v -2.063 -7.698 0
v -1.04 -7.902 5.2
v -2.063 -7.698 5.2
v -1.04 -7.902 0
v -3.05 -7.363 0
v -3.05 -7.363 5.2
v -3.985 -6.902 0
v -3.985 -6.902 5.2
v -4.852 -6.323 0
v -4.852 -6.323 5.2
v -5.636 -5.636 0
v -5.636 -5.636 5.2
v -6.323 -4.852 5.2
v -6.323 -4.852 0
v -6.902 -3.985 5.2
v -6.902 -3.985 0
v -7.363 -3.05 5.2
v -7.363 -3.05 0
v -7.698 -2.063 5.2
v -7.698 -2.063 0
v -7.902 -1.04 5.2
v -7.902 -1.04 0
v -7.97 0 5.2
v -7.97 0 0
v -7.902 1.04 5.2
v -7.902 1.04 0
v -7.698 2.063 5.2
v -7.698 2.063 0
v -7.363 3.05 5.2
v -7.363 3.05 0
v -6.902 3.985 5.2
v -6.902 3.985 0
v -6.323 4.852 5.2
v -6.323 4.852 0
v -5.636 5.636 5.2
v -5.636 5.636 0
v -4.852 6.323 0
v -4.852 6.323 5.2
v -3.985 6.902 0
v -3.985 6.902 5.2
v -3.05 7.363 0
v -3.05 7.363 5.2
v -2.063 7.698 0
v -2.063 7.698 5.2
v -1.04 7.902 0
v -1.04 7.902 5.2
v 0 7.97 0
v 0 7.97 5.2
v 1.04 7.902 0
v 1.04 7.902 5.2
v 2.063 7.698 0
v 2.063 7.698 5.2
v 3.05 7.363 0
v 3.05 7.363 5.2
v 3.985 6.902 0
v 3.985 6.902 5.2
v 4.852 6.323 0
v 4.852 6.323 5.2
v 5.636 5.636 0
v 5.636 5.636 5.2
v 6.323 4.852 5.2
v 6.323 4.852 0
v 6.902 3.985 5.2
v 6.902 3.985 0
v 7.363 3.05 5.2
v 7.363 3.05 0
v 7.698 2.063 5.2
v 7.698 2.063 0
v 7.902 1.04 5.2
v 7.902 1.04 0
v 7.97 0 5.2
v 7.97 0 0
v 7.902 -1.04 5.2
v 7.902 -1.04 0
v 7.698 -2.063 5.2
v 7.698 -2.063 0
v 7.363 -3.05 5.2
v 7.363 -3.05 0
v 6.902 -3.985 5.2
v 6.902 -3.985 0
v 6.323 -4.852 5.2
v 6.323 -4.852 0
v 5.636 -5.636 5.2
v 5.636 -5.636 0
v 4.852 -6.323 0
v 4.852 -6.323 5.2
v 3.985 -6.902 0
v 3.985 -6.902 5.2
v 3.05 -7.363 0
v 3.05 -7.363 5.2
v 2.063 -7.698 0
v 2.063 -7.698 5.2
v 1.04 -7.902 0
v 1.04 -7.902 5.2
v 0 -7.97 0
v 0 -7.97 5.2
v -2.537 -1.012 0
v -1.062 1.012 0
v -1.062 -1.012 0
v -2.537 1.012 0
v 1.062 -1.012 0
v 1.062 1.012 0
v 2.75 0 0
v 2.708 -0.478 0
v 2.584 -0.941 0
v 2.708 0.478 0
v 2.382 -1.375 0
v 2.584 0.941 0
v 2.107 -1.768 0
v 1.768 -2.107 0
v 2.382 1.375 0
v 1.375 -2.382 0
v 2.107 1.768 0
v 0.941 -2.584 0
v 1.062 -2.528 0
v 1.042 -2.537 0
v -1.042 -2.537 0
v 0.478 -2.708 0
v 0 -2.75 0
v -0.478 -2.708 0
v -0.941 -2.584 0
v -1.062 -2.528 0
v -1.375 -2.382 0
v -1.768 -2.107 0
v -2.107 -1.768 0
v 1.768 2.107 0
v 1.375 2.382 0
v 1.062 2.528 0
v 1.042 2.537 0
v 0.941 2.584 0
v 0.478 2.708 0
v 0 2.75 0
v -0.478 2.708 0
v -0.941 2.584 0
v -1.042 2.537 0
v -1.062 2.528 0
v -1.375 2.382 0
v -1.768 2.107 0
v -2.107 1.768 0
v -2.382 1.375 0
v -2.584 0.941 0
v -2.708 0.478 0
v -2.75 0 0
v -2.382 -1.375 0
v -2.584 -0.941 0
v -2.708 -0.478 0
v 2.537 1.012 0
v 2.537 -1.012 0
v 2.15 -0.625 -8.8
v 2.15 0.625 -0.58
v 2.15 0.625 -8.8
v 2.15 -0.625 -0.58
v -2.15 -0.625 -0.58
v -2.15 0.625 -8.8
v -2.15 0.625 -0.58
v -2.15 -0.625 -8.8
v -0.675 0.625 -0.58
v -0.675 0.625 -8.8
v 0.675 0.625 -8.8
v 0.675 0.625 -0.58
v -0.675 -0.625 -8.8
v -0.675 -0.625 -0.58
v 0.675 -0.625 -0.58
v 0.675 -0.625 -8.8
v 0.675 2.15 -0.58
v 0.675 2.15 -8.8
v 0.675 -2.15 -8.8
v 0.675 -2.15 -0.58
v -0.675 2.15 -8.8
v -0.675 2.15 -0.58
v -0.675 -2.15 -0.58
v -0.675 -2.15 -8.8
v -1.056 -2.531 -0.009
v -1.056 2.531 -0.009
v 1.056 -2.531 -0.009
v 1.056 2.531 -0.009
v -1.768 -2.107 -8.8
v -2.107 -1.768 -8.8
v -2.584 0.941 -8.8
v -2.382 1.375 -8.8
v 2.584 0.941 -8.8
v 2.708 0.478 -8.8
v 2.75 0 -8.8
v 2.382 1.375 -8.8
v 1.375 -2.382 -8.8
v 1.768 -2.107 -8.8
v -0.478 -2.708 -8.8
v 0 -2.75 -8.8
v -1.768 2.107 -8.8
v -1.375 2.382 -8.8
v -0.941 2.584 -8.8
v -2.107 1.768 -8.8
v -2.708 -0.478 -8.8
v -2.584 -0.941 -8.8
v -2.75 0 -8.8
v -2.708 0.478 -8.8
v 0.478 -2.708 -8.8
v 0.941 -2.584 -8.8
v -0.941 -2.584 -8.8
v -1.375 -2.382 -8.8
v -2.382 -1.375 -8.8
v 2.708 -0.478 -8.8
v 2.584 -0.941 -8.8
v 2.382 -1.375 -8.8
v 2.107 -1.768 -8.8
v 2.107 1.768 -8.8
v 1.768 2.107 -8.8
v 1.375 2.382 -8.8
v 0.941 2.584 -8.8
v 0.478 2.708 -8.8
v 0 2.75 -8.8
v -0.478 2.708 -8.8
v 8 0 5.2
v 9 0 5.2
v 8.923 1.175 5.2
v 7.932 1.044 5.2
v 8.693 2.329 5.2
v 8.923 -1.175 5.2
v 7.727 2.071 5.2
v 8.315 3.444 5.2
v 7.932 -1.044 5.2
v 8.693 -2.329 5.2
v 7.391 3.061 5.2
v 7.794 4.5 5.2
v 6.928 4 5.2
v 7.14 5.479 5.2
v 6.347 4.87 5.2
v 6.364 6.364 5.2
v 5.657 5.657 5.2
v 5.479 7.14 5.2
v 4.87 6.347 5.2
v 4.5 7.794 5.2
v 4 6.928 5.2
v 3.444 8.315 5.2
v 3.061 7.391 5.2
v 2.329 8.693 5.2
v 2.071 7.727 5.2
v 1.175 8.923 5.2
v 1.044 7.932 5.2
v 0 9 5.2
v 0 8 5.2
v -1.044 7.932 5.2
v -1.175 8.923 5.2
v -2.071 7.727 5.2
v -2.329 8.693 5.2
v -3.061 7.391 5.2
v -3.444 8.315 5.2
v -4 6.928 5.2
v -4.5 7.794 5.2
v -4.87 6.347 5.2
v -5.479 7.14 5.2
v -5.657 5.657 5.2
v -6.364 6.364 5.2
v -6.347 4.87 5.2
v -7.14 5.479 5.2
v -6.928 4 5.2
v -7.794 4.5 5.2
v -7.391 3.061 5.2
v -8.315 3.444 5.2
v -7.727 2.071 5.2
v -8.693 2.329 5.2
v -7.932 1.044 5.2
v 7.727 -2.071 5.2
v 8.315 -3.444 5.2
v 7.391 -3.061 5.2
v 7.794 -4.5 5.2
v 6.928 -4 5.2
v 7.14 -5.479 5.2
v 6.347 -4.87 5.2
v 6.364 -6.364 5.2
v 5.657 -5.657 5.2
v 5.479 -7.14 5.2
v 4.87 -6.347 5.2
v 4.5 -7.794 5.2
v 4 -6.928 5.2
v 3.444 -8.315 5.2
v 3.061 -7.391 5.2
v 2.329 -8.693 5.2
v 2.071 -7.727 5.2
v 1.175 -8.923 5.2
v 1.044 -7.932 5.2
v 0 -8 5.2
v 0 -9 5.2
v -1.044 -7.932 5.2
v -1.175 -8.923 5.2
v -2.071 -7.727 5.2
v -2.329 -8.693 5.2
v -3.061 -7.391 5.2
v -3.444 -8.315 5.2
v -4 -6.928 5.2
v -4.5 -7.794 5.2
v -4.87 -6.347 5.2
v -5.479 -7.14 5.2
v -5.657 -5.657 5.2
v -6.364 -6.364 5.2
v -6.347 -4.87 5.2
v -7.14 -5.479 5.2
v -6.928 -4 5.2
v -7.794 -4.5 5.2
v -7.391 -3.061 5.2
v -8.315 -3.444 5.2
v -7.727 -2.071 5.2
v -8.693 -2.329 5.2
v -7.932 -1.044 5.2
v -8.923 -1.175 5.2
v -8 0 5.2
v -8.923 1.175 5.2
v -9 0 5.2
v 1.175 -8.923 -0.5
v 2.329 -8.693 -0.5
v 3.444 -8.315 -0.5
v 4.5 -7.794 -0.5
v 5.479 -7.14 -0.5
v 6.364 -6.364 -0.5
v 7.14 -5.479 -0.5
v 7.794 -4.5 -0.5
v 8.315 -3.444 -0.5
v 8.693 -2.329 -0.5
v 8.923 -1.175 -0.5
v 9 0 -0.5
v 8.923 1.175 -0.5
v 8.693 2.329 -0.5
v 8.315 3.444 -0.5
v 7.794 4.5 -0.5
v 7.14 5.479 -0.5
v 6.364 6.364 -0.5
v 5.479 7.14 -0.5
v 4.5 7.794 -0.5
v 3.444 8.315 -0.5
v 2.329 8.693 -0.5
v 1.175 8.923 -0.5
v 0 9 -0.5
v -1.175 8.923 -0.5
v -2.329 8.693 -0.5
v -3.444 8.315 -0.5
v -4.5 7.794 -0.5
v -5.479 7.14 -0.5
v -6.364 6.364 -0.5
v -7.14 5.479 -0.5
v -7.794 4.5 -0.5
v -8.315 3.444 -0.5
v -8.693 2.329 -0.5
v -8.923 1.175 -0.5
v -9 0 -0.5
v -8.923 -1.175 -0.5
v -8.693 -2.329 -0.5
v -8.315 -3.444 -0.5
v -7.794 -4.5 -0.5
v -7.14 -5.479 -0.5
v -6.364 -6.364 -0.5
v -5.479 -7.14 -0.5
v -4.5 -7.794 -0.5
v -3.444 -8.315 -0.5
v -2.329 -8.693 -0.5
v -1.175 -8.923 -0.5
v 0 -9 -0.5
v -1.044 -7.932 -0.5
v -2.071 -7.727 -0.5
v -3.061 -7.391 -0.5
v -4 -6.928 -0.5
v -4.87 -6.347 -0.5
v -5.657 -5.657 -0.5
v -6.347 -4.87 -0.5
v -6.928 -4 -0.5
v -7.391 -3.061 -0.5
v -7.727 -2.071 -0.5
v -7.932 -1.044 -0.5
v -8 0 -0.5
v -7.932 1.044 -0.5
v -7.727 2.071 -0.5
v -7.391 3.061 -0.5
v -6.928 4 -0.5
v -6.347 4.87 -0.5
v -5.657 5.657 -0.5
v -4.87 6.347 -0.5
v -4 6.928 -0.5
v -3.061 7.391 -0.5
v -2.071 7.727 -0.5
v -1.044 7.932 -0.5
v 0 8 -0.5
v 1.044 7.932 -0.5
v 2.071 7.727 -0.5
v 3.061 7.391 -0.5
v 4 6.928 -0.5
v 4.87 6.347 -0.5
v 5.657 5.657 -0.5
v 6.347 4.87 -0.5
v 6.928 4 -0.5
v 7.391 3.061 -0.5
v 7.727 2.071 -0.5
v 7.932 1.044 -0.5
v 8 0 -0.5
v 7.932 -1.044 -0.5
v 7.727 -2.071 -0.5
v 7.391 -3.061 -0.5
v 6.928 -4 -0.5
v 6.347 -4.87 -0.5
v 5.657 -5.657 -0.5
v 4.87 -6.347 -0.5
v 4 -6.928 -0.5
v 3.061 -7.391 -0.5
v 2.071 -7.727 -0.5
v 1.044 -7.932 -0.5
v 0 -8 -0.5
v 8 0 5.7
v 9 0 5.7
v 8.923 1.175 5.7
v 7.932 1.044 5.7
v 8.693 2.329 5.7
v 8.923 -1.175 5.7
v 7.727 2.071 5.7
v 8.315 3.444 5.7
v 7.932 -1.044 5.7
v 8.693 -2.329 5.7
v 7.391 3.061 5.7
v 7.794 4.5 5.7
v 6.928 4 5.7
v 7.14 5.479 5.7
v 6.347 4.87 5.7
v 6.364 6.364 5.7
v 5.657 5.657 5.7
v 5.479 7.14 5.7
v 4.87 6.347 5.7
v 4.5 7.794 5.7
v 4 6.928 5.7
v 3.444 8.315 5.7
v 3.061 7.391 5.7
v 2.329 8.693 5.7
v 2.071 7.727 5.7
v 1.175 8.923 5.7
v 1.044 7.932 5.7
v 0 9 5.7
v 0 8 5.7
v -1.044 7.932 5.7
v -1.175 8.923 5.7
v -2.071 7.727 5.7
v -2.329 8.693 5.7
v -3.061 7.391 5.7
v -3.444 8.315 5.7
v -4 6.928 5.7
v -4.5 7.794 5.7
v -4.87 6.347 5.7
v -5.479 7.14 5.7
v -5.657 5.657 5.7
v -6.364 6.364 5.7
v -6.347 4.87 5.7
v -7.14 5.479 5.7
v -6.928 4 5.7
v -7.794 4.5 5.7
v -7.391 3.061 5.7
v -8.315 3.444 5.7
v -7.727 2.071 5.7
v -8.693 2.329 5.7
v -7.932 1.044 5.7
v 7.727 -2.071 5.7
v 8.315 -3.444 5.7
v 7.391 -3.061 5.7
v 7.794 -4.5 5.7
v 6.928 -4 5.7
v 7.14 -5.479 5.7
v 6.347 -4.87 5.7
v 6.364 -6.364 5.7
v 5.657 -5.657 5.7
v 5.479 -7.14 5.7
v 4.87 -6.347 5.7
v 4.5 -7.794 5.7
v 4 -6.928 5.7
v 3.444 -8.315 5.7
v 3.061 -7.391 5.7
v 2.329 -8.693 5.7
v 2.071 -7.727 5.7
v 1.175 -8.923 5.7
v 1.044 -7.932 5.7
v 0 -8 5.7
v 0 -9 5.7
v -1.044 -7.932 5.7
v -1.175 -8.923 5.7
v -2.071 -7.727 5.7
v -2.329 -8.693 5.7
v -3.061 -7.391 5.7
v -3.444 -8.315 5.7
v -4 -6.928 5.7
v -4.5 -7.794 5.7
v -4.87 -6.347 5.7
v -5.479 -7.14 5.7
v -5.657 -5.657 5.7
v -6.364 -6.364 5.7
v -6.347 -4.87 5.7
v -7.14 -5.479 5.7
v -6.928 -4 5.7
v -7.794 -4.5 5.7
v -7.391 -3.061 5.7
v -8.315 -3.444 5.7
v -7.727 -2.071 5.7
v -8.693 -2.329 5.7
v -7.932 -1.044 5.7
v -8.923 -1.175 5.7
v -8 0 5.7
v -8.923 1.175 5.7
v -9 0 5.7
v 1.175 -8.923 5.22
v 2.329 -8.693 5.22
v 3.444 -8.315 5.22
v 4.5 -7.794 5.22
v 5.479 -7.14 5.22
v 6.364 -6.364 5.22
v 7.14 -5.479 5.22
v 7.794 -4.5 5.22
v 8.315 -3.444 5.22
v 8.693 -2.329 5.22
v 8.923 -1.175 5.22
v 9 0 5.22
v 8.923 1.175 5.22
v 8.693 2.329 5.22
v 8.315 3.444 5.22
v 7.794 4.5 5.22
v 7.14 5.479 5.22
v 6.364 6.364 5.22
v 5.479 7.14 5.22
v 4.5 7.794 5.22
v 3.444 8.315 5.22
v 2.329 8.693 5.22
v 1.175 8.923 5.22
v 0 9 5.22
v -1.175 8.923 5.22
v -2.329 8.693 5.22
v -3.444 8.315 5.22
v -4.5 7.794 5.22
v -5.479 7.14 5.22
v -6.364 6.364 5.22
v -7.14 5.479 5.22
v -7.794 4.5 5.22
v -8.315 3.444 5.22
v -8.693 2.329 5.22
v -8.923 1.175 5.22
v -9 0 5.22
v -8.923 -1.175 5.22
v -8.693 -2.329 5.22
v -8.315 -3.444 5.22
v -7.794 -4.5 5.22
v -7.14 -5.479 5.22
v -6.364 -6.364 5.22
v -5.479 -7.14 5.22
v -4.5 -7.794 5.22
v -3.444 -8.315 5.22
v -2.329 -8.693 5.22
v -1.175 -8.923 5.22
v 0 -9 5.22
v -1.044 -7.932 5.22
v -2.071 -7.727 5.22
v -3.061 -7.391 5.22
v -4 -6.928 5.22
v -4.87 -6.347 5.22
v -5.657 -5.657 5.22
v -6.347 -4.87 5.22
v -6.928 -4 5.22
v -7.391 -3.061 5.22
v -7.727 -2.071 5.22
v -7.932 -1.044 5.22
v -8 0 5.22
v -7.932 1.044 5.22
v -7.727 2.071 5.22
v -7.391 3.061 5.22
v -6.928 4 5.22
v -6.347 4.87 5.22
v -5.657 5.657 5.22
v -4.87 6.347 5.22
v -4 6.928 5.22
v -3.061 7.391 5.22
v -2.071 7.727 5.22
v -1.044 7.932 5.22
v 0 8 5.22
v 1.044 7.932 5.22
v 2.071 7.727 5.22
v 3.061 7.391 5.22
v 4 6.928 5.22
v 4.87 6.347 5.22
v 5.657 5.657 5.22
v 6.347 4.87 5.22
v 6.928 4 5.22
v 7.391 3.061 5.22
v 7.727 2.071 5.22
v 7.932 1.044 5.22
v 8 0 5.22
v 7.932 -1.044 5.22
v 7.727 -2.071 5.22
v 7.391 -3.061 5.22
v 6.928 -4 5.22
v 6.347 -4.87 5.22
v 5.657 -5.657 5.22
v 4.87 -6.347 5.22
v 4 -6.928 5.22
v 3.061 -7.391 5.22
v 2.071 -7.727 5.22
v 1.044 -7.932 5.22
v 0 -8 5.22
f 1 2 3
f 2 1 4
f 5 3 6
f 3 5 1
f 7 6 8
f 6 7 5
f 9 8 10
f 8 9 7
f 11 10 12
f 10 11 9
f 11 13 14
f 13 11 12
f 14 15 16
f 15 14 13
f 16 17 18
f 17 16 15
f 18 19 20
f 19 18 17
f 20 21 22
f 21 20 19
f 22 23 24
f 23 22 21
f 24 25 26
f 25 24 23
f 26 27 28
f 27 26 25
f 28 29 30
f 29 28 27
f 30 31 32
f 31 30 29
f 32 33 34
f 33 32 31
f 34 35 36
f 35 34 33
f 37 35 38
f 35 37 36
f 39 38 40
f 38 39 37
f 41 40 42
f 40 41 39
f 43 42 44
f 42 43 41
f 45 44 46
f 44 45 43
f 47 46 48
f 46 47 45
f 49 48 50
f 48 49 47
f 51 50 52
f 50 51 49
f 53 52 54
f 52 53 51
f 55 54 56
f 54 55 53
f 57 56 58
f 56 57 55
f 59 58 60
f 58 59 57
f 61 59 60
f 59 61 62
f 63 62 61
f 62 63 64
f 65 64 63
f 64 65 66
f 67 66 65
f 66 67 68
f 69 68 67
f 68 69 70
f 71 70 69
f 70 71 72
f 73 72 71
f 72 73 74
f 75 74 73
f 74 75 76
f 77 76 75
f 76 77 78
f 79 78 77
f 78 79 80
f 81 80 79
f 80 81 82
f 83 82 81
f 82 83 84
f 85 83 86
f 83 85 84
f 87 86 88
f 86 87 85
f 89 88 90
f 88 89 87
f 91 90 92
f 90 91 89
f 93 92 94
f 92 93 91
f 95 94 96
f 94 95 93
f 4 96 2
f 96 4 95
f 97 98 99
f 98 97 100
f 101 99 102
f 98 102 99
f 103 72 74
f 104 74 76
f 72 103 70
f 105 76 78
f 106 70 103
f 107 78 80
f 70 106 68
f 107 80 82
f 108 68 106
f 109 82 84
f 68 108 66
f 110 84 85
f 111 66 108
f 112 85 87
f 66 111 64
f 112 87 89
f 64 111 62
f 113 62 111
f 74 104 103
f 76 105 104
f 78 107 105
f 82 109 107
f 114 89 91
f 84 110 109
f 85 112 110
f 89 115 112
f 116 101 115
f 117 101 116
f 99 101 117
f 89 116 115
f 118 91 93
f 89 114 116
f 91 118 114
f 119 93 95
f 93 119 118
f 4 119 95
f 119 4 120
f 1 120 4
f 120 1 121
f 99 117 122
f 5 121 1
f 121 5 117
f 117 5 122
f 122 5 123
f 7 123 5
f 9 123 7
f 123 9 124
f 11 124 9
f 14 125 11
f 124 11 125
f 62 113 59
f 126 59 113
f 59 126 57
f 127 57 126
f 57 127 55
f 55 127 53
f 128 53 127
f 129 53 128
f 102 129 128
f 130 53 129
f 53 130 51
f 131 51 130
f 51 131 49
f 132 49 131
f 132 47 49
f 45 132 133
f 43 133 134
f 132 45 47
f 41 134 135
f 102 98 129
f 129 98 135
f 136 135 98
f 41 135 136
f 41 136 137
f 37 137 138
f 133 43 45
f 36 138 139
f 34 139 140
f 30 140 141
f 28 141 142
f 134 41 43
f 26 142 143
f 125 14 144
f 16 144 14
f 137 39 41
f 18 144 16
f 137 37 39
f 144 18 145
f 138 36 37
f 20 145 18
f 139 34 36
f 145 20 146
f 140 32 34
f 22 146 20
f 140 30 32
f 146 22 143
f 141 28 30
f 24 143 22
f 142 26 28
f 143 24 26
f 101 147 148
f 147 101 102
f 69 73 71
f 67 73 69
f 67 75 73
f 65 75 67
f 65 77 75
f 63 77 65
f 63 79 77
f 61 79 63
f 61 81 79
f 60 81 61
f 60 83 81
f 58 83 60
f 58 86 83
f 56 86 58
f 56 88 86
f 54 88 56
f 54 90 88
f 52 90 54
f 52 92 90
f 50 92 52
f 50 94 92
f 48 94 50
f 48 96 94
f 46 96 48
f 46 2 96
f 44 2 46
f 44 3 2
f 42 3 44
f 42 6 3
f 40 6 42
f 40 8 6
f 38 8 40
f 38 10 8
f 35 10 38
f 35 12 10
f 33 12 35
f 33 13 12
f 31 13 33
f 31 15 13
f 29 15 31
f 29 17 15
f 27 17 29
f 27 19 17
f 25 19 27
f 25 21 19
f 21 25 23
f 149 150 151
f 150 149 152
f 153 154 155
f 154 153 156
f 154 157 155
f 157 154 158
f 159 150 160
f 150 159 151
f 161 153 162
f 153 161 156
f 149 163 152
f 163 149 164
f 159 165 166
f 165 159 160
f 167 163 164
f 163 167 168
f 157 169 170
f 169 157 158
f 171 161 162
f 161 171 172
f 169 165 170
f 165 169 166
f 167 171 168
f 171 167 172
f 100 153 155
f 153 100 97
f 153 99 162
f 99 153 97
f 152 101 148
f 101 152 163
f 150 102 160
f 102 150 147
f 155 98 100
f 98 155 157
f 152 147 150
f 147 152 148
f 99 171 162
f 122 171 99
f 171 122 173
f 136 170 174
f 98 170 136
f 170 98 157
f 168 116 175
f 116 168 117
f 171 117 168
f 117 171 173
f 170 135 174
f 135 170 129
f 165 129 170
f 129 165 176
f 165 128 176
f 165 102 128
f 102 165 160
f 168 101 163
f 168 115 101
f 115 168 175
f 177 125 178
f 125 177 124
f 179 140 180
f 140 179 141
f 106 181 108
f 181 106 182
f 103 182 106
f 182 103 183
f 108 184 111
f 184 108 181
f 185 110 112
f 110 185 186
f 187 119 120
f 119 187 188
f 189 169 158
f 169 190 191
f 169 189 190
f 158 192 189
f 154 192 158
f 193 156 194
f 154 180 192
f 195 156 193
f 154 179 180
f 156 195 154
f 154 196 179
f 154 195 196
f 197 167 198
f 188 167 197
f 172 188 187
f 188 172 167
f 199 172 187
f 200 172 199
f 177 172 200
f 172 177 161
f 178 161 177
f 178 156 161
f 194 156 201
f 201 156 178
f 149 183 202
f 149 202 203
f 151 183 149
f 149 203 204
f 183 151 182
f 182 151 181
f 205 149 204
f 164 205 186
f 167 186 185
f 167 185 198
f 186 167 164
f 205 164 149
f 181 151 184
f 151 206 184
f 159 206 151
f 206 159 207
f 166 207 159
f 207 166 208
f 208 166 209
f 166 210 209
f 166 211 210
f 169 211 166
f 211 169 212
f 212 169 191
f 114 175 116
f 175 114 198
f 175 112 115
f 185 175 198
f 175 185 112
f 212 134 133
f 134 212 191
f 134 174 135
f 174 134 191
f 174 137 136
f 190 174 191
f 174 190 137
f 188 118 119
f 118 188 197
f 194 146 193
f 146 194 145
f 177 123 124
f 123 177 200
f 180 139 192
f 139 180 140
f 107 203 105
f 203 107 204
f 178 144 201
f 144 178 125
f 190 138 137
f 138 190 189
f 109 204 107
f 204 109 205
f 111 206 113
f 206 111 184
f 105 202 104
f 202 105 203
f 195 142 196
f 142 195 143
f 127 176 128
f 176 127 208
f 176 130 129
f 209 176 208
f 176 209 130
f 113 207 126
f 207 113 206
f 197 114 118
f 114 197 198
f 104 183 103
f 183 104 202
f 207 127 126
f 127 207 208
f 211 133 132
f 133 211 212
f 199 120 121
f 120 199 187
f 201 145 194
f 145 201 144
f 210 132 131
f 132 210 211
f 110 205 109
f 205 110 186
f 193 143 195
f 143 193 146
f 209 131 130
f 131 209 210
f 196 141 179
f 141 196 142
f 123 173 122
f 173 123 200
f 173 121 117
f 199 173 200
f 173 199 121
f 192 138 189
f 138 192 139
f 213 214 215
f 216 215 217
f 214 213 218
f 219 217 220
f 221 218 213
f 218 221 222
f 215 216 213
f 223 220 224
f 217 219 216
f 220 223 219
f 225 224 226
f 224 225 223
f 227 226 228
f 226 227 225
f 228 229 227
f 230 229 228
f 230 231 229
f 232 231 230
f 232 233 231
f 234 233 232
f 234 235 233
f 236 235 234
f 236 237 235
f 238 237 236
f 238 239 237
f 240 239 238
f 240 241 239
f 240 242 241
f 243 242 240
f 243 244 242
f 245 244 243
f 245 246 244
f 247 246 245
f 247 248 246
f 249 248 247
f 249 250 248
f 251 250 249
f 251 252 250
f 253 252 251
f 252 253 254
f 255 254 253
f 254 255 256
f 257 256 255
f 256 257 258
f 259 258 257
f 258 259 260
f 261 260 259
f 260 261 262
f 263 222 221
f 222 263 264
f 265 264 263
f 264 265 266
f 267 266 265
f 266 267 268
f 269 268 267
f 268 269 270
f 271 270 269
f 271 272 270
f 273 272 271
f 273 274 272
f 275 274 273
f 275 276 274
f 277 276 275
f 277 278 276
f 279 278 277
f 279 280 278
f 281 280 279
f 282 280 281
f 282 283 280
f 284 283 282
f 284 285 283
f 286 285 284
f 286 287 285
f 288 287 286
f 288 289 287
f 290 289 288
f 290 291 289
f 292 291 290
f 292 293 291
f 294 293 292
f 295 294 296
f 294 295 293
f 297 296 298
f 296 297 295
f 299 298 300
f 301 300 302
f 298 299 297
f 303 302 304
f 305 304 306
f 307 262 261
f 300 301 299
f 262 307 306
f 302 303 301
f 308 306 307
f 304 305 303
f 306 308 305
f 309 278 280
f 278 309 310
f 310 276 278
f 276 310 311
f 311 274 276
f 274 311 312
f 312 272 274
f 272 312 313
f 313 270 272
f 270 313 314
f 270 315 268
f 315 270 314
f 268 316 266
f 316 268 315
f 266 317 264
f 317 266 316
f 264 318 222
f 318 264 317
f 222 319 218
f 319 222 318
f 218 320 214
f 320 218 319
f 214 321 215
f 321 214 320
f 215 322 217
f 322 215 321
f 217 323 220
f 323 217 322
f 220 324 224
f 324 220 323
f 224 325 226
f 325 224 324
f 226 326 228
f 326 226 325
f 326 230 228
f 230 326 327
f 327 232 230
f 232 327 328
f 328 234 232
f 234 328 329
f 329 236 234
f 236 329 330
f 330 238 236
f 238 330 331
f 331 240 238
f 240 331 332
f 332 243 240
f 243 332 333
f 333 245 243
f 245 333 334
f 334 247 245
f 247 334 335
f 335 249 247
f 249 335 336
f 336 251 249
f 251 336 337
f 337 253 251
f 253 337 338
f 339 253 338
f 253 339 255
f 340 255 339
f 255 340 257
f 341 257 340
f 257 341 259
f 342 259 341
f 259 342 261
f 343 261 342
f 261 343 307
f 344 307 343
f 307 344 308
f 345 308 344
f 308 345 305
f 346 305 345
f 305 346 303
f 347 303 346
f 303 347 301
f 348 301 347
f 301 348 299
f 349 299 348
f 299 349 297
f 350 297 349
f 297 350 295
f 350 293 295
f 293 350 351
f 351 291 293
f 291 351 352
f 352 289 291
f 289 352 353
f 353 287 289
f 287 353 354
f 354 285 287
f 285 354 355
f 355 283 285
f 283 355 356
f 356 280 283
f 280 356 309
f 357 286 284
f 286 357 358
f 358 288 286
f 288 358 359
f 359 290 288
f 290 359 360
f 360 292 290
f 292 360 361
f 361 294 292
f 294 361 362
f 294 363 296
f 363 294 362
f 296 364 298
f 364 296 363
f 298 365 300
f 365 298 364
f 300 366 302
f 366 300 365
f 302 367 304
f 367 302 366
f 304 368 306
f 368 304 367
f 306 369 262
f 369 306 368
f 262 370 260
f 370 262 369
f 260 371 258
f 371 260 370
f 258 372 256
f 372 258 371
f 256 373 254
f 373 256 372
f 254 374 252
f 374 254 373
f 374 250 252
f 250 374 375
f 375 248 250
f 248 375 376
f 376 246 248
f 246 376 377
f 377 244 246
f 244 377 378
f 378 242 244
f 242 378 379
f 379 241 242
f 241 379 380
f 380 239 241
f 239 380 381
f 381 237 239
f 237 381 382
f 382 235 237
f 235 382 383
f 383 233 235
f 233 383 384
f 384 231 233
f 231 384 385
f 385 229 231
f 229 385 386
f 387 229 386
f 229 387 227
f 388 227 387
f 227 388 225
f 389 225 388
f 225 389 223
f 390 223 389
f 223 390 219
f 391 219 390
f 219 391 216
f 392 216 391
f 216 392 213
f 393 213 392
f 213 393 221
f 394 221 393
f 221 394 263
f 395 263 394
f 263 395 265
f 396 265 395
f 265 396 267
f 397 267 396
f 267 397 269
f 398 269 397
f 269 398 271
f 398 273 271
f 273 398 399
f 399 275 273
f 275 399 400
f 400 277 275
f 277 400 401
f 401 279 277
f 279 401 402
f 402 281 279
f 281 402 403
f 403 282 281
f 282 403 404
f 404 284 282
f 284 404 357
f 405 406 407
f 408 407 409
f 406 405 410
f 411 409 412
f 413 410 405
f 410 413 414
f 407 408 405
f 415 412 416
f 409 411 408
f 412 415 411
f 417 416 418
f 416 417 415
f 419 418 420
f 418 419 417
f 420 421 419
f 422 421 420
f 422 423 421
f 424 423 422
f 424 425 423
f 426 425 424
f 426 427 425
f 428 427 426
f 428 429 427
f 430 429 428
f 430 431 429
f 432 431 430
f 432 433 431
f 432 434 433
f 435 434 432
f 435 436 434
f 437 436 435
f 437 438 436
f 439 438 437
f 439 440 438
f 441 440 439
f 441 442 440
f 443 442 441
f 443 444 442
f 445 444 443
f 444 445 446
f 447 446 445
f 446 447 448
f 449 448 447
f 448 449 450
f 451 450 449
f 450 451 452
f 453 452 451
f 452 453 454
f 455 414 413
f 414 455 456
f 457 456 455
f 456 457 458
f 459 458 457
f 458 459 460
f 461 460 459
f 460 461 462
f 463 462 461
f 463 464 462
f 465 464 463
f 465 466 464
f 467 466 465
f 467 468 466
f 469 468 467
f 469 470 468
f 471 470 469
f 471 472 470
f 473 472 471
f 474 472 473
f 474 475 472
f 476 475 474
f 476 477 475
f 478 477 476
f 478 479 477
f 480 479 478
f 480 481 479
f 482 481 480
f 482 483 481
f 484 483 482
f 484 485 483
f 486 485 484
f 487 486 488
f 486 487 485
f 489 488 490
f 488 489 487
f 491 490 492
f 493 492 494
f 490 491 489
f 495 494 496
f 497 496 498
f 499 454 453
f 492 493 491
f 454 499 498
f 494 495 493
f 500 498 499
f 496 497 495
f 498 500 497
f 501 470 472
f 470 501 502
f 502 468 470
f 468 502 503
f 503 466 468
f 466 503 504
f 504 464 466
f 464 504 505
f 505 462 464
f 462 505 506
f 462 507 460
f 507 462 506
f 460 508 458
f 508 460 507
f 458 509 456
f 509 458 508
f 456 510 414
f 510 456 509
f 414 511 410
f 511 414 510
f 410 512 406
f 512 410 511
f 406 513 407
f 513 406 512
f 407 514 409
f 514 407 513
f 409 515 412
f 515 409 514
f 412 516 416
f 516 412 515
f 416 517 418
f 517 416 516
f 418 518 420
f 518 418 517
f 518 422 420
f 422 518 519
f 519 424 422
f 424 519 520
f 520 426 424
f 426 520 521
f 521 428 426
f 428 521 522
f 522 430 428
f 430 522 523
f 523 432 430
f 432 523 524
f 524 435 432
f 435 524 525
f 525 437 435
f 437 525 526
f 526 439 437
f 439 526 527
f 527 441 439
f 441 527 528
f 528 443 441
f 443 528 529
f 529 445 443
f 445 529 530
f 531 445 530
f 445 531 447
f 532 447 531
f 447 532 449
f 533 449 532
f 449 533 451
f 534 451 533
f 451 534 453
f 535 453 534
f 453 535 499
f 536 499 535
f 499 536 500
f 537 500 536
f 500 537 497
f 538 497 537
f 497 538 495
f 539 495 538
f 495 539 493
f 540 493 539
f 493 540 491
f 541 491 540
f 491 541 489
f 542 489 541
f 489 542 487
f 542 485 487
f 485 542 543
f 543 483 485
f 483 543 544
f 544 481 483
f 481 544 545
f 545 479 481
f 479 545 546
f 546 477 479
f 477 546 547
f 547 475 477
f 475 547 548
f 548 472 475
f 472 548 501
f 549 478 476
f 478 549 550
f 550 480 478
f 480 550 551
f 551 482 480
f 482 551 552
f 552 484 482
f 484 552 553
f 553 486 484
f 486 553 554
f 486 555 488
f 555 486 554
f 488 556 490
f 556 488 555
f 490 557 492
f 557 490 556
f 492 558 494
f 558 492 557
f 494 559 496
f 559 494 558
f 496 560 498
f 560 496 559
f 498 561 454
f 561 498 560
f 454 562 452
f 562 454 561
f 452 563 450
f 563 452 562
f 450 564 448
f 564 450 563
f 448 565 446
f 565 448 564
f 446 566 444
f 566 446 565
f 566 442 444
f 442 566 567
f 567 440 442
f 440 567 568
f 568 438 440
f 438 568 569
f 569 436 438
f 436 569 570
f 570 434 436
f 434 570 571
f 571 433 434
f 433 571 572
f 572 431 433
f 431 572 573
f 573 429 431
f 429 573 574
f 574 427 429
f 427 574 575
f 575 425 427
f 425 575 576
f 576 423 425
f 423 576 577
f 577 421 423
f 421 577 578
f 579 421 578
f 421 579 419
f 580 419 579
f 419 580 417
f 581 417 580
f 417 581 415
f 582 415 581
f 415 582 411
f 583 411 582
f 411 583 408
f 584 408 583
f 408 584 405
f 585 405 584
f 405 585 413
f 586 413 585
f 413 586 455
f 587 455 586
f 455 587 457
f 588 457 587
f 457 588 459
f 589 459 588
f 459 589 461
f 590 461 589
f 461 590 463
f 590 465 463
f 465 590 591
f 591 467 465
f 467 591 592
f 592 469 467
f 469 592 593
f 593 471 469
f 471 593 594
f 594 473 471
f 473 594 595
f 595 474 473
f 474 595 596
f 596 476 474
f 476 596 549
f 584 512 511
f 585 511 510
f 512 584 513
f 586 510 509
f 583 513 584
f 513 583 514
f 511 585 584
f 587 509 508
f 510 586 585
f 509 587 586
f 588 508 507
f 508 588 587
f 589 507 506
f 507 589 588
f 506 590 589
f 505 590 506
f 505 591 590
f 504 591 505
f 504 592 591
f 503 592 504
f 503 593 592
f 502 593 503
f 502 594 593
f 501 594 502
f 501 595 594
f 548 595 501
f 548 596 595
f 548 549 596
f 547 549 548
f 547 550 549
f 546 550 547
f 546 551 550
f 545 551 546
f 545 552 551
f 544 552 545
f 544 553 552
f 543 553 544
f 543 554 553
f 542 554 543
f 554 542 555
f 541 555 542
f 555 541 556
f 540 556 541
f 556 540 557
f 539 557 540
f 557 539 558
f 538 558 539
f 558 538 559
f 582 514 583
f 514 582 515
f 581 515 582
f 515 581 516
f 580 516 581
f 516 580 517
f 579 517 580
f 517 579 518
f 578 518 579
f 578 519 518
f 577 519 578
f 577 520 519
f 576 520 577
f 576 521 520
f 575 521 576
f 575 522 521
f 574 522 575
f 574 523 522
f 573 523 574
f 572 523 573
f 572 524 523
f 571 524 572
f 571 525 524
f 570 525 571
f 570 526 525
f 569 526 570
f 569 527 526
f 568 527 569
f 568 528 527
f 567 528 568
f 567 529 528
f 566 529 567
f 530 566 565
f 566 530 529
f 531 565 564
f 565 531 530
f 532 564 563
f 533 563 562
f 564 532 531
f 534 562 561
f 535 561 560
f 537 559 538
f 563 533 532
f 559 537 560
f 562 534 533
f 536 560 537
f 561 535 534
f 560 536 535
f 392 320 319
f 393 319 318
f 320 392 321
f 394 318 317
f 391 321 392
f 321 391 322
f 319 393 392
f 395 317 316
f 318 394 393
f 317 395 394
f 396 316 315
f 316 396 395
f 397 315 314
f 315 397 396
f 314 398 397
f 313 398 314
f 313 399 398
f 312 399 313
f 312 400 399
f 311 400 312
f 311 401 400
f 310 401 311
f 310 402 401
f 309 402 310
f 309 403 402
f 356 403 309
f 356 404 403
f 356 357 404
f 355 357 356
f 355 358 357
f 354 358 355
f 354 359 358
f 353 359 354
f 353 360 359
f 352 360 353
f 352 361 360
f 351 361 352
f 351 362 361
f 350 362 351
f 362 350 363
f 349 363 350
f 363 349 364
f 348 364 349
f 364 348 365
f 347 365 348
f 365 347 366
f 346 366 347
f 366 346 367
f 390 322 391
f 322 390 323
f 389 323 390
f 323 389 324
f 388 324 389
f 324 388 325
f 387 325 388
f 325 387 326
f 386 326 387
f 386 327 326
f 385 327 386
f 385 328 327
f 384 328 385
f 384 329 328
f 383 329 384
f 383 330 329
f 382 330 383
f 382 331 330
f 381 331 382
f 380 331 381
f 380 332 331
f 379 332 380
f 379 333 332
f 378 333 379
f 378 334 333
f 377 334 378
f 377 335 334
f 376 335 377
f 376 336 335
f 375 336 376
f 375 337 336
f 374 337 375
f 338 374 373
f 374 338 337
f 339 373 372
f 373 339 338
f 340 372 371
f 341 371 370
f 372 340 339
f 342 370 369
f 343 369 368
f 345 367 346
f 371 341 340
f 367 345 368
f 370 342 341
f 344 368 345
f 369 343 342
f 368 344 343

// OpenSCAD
// file: ../modules/homing_bar.scad
function homing_bar_curve_steps(
    diameter,
    quality = "export",
    preview_angle = 12,
    export_angle = 6,
    preview_chord = 0.5,
    export_chord = 0.25,
    minimum_steps = 18,
    preview_max_steps = 30,
    export_max_steps = 60
) =
    let(
        safe_radius = max(diameter / 2, 0.01),
        max_angle = quality == "preview" ? preview_angle : export_angle,
        max_chord = quality == "preview" ? preview_chord : export_chord,
        max_steps = quality == "preview" ? preview_max_steps : export_max_steps,
        angle_steps = ceil(360 / max(max_angle, 0.1)),
        chord_steps = ceil(2 * PI * safe_radius / max(max_chord, 0.01))
    )
    min(max(max(angle_steps, chord_steps), minimum_steps), max_steps);

function homing_bar_chamfer_steps(
    chamfer,
    quality = "export",
    preview_step = 0.12,
    export_step = 0.06,
    preview_max_steps = 8,
    export_max_steps = 18
) =
    let(
        step = quality == "preview" ? preview_step : export_step,
        max_steps = quality == "preview" ? preview_max_steps : export_max_steps
    )
    chamfer <= 0 ? 1 : min(max(ceil(chamfer / max(step, 0.01)), 2), max_steps);

function homing_bar_profile_dimension(value, minimum = 0.02) = max(value, minimum);

function homing_bar_chamfer_inset(t, height, inset) =
    height <= 0 || inset <= 0
        ? 0
        : let(progress = min(max(t / height, 0), 1))
            inset * (1 - sqrt(max(1 - progress * progress, 0)));

module homing_bar_profile(length, width, quality = "export") {
    end_steps = homing_bar_curve_steps(width, quality);
    cap_length = max(length, width);

    hull() {
        translate([-cap_length / 2 + width / 2, 0])
            circle(d = width, $fn = end_steps);
        translate([ cap_length / 2 - width / 2, 0])
            circle(d = width, $fn = end_steps);
    }
}

module homing_bar_profile_slice(length, width, inset, z, quality = "export", slice_height = 0.01) {
    slice_z = max(z - slice_height, 0);

    translate([0, 0, slice_z])
        // Thin slices give hull() a solid section without extending the cap above the requested height.
        linear_extrude(height = slice_height)
            homing_bar_profile(
                homing_bar_profile_dimension(length - inset * 2),
                homing_bar_profile_dimension(width - inset * 2),
                quality
            );
}

module homing_bar_cap(length, width, height, chamfer = 0, quality = "export") {
    cap_height = max(height, 0.05);
    max_inset = max(width / 2 - 0.01, 0);
    cap_chamfer = min(max(chamfer, 0), max_inset);
    chamfer_height = min(cap_chamfer, cap_height);
    straight_height = cap_height - chamfer_height;
    chamfer_steps = homing_bar_chamfer_steps(cap_chamfer, quality);

    if (cap_chamfer <= 0.001 || chamfer_height <= 0.001) {
        linear_extrude(height = cap_height)
            homing_bar_profile(length, width, quality);
    } else {
        union() {
            if (straight_height > 0.001) {
                linear_extrude(height = straight_height + 0.01)
                    homing_bar_profile(length, width, quality);
            }

            for (step_index = [0:chamfer_steps - 1]) {
                t0 = chamfer_height * step_index / chamfer_steps;
                t1 = chamfer_height * (step_index + 1) / chamfer_steps;
                hull() {
                    homing_bar_profile_slice(
                        length,
                        width,
                        homing_bar_chamfer_inset(t0, chamfer_height, cap_chamfer),
                        straight_height + t0,
                        quality
                    );
                    homing_bar_profile_slice(
                        length,
                        width,
                        homing_bar_chamfer_inset(t1, chamfer_height, cap_chamfer),
                        straight_height + t1,
                        quality
                    );
                }
            }
        }
    }
}

module homing_bar_blank(
    length,
    width,
    height,
    base_thickness,
    offset_y,
    base_z,
    chamfer = 0,
    quality = "export"
) {
    cap_height = max(height, 0.05);
    contact_height = max(base_thickness, 0.05);
    contact_length = length + contact_height * 1.6;
    contact_width = width + contact_height * 1.2;

    translate([0, offset_y, base_z])
        union() {
            hull() {
                linear_extrude(height = 0.01)
                    homing_bar_profile(contact_length, contact_width, quality);
                translate([0, 0, contact_height])
                    linear_extrude(height = 0.01)
                        homing_bar_profile(length, width, quality);
            }

            translate([0, 0, contact_height])
                homing_bar_cap(length, width, cap_height, chamfer, quality);
        }
}
// file: ../modules/stem_alps.scad
function positive_alps_stem_dimension(value, minimum = 0.1) = max(value, minimum);

module alps_post(stem_length, stem_width, stem_height, lead_in) {
    safe_length = positive_alps_stem_dimension(stem_length);
    safe_width = positive_alps_stem_dimension(stem_width);
    safe_height = max(stem_height, 0.2);
    safe_lead_in = min(lead_in, safe_length * 0.2, safe_width * 0.3, safe_height * 0.4);

    hull() {
        linear_extrude(height = max(safe_height - safe_lead_in, 0.01))
            square([safe_length, safe_width], center = true);

        translate([0, 0, safe_height - 0.01])
            linear_extrude(height = 0.01)
                square([
                    positive_alps_stem_dimension(safe_length - safe_lead_in * 2),
                    positive_alps_stem_dimension(safe_width - safe_lead_in * 2)
                ], center = true);
    }
}

module stem_alps(
    stem_length = 4.45,
    stem_width = 2.25,
    stem_height = 3.5,
    base_clearance = 0,
    lead_in = 0.12,
    quality = "export"
) {
    translate([0, 0, base_clearance])
        alps_post(stem_length, stem_width, stem_height, lead_in);
}
// file: ../modules/stem_choc_v2.scad
use <stem_mx.scad>

module stem_choc_v2(
    outer_diameter = 5.5,
    stem_height = 6.5,
    base_clearance = 0,
    cross_width_horizontal = 1.25,
    cross_length_horizontal = 4.3,
    cross_width_vertical = 1.35,
    cross_length_vertical = 4.3,
    cross_chamfer = 0.4,
    chamfer_height = 0.6,
    quality = "export"
) {
    stem_mx(
        outer_diameter = outer_diameter,
        stem_height = stem_height,
        base_clearance = base_clearance,
        cross_width_horizontal = cross_width_horizontal,
        cross_length_horizontal = cross_length_horizontal,
        cross_width_vertical = cross_width_vertical,
        cross_length_vertical = cross_length_vertical,
        cross_chamfer = cross_chamfer,
        chamfer_height = chamfer_height,
        quality = quality
    );
}
// file: ../modules/stem_choc_v1.scad
function positive_choc_stem_dimension(value, minimum = 0.1) = max(value, minimum);

module choc_v1_prong(prong_width, prong_depth, prong_height, lead_in) {
    safe_width = positive_choc_stem_dimension(prong_width);
    safe_depth = positive_choc_stem_dimension(prong_depth);
    safe_height = max(prong_height, 0.2);
    safe_lead_in = min(lead_in, safe_width * 0.4, safe_depth * 0.2, safe_height * 0.4);

    hull() {
        linear_extrude(height = max(safe_height - safe_lead_in, 0.01))
            square([safe_width, safe_depth], center = true);

        translate([0, 0, safe_height - 0.01])
            linear_extrude(height = 0.01)
                square([
                    positive_choc_stem_dimension(safe_width - safe_lead_in * 2),
                    positive_choc_stem_dimension(safe_depth - safe_lead_in * 2)
                ], center = true);
    }
}

module stem_choc_v1(
    prong_width = 1.2,
    prong_depth = 3.0,
    prong_spacing = 5.7,
    stem_height = 3.0,
    base_clearance = 0,
    lead_in = 0.12,
    quality = "export"
) {
    for (offset_x = [prong_spacing / 2, -prong_spacing / 2]) {
        translate([offset_x, 0, base_clearance])
            choc_v1_prong(prong_width, prong_depth, stem_height, lead_in);
    }
}
// file: ../modules/stem_mx.scad
function stem_curve_steps(
    diameter,
    quality = "export",
    preview_angle = 10,
    export_angle = 5,
    preview_chord = 0.6,
    export_chord = 0.25,
    minimum_steps = 24,
    preview_max_steps = 48,
    export_max_steps = 96
) =
    let(
        safe_radius = max(diameter / 2, 0.01),
        max_angle = quality == "preview" ? preview_angle : export_angle,
        max_chord = quality == "preview" ? preview_chord : export_chord,
        max_steps = quality == "preview" ? preview_max_steps : export_max_steps,
        angle_steps = ceil(360 / max(max_angle, 0.1)),
        chord_steps = ceil(2 * PI * safe_radius / max(max_chord, 0.01))
    )
    min(max(max(angle_steps, chord_steps), minimum_steps), max_steps);

module stem_slot(length, width, height) {
    translate([-length / 2, -width / 2, 0])
        cube([length, width, height]);
}

module stem_mx(
    outer_diameter = 5.5,
    stem_height = 4.5,
    base_clearance = 0,
    cross_width_horizontal = 1.25,
    cross_length_horizontal = 4.3,
    cross_width_vertical = 1.35,
    cross_length_vertical = 4.3,
    cross_chamfer = 0.4,
    chamfer_height = 0.6,
    quality = "export"
) {
    outer_steps = stem_curve_steps(outer_diameter, quality);
    safe_height = max(stem_height, 0.2);

    difference() {
        translate([0, 0, base_clearance])
            cylinder(d = outer_diameter, h = safe_height, $fn = outer_steps);

        translate([0, 0, base_clearance]) {
            stem_slot(cross_length_horizontal, cross_width_horizontal, safe_height + 1);
            stem_slot(cross_width_vertical, cross_length_vertical, safe_height + 1);
        }

        if (cross_chamfer > 0) {
            translate([0, 0, base_clearance - 0.01])
                hull() {
                    stem_slot(
                        cross_length_horizontal + cross_chamfer * 2,
                        cross_width_horizontal + cross_chamfer * 2,
                        0.01
                    );
                    translate([0, 0, chamfer_height])
                        stem_slot(cross_length_horizontal, cross_width_horizontal, 0.01);
                }

            translate([0, 0, base_clearance - 0.01])
                hull() {
                    stem_slot(
                        cross_width_vertical + cross_chamfer * 2,
                        cross_length_vertical + cross_chamfer * 2,
                        0.01
                    );
                    translate([0, 0, chamfer_height])
                        stem_slot(cross_width_vertical, cross_length_vertical, 0.01);
                }
        }
    }
}
// file: ../modules/legend_block.scad
function legend_quality_steps(quality, preview_steps, export_steps) =
    quality == "preview" ? preview_steps : export_steps;
function legend_text_curve_steps(quality = "export") =
    legend_quality_steps(quality, 48, 96);
function legend_text_internal_scale(quality = "export") =
    legend_quality_steps(quality, 6, 10);
// Keep legend size tied to the user's explicit control value without auto-fitting by label length.
function legend_text_size(size) = max(size, 0);

module legend_text_shape(label, size, font_name, curve_steps = 48) {
    text(
        text = label,
        size = size,
        font = font_name,
        halign = "center",
        valign = "center",
        $fn = curve_steps
    );
}

// Keep decoration options available across bundled fonts without requiring extra font files.
module legend_text_profile(
    label,
    size,
    font_name,
    outline_delta = 0,
    curve_steps = 48
) {
    if (abs(outline_delta) > 0.0001) {
        offset(delta = outline_delta)
            legend_text_shape(
                label = label,
                size = size,
                font_name = font_name,
                curve_steps = curve_steps
            );
    } else {
        legend_text_shape(
            label = label,
            size = size,
            font_name = font_name,
            curve_steps = curve_steps
        );
    }
}

module legend_block(
    label,
    width,
    depth,
    height,
    offset_x,
    offset_y,
    base_z,
    font_name = "M PLUS 1:style=Regular",
    underline_enabled = false,
    underline_width = 0,
    underline_thickness = 0,
    underline_offset_y = 0,
    outline_delta = 0,
    text_size = undef,
    quality = "export"
) {
    if (!is_undef(label) && len(label) > 0) {
        size = legend_text_size(is_undef(text_size) ? depth : text_size);
        curve_steps = legend_text_curve_steps(quality);
        internal_scale = legend_text_internal_scale(quality);

        translate([offset_x, offset_y, base_z])
            linear_extrude(height = height, center = false, convexity = 10)
                // Build glyph outlines at a larger internal scale so the bundled runtime
                // preserves more of the original font curvature before scaling back down.
                scale([1 / internal_scale, 1 / internal_scale, 1])
                    union() {
                        legend_text_profile(
                            label = label,
                            size = size * internal_scale,
                            font_name = font_name,
                            outline_delta = outline_delta * internal_scale,
                            curve_steps = curve_steps
                        );

                        if (underline_enabled && underline_width > 0 && underline_thickness > 0) {
                            translate([0, underline_offset_y * internal_scale])
                                square(
                                    [underline_width * internal_scale, underline_thickness * internal_scale],
                                    center = true
                                );
                        }
                    }
    }
}
// file: ../presets/stem-nominals.scad
stem_nominal_outer_diameter = 5.5;
legacy_stem_nominal_width = stem_nominal_outer_diameter;
legacy_stem_nominal_depth = stem_nominal_outer_diameter;
stem_nominal_height = 6.5;
stem_nominal_inset = 0;
stem_nominal_cross_width_horizontal = 1.25;
stem_nominal_cross_length_horizontal = 4.3;
stem_nominal_cross_width_vertical = 1.35;
stem_nominal_cross_length_vertical = 4.3;
stem_nominal_cross_chamfer = 0.4;

stem_mx_nominal_outer_diameter = 5.5;
stem_mx_nominal_height = 4.5;
stem_mx_nominal_inset = 0;
stem_mx_nominal_cross_width_horizontal = stem_nominal_cross_width_horizontal;
stem_mx_nominal_cross_length_horizontal = stem_nominal_cross_length_horizontal;
stem_mx_nominal_cross_width_vertical = stem_nominal_cross_width_vertical;
stem_mx_nominal_cross_length_vertical = stem_nominal_cross_length_vertical;
stem_mx_nominal_cross_chamfer = stem_nominal_cross_chamfer;

stem_choc_v2_nominal_outer_diameter = stem_nominal_outer_diameter;
stem_choc_v2_nominal_height = stem_nominal_height;
stem_choc_v2_nominal_inset = stem_nominal_inset;
stem_choc_v2_nominal_cross_width_horizontal = stem_nominal_cross_width_horizontal;
stem_choc_v2_nominal_cross_length_horizontal = stem_nominal_cross_length_horizontal;
stem_choc_v2_nominal_cross_width_vertical = stem_nominal_cross_width_vertical;
stem_choc_v2_nominal_cross_length_vertical = stem_nominal_cross_length_vertical;
stem_choc_v2_nominal_cross_chamfer = stem_nominal_cross_chamfer;

stem_choc_v1_nominal_height = 3.0;
stem_choc_v1_nominal_inset = 0;
stem_choc_v1_nominal_prong_width = 1.2;
stem_choc_v1_nominal_prong_depth = 3.0;
stem_choc_v1_nominal_prong_spacing = 5.7;
stem_choc_v1_nominal_lead_in = 0.12;

stem_alps_nominal_height = 3.5;
stem_alps_nominal_inset = 0;
stem_alps_nominal_length = 4.45;
stem_alps_nominal_width = 2.25;
stem_alps_nominal_lead_in = 0.12;
// file: common/typewriter-params.scad
user_shape_geometry_type = "typewriter";
user_key_width = 18;
user_key_depth = 18;
user_top_center_height = 5.2;
user_wall_thickness = 1.1;
user_top_scale = 1;
user_typewriter_corner_radius = 9;
user_typewriter_mount_height = 11.68;
user_profile_front_angle = 0;
user_profile_back_angle = 0;
user_profile_left_angle = 0;
user_profile_right_angle = 0;
user_top_thickness = 1.2;
user_bottom_corner_radius = 0;
user_top_corner_radius = 0;
user_top_shape_type = "flat";
user_dish_radius = 45;
user_dish_depth = 0;
user_top_pitch_deg = 0;
user_top_roll_deg = 0;
user_rim_enabled = false;
user_rim_width = 0;
user_rim_height_up = 0;
user_rim_height_down = 0;

user_legend_enabled = true;
user_legend_text = "A";
user_legend_font_name = "M PLUS 1:style=Regular";
user_legend_underline_enabled = false;
user_legend_underline_width = 0;
user_legend_underline_thickness = 0;
user_legend_underline_offset_y = 0;
user_legend_width = 7.2;
user_legend_depth = 4.0;
user_legend_height = 0;
user_legend_embed = 0.6;
user_legend_outline_delta = 0;
user_legend_offset_x = 0;
user_legend_offset_y = 0;

user_homing_bar_enabled = false;
user_homing_bar_height = 0.6;
user_homing_bar_length = 4.0;
user_homing_bar_width = 1.58;
user_homing_bar_offset_y = -3.5;
user_homing_bar_base_thickness = 0.35;
user_homing_bar_chamfer = 0.3;

user_stem_type = "choc_v2";
user_stem_enabled = true;
user_stem_outer_delta = 0;
user_stem_cross_margin = 0;
user_stem_inset_delta = 0;
// main file
export_target = "preview";

include <common/typewriter-params.scad>

user_typewriter_mount_height = 14.0;
user_rim_enabled = true;
user_rim_width = 1.0;
user_rim_height_up = 0.5;
user_rim_height_down = 0.5;
user_legend_enabled = false;
user_homing_bar_enabled = false;

include <../base/keycap.scad>
